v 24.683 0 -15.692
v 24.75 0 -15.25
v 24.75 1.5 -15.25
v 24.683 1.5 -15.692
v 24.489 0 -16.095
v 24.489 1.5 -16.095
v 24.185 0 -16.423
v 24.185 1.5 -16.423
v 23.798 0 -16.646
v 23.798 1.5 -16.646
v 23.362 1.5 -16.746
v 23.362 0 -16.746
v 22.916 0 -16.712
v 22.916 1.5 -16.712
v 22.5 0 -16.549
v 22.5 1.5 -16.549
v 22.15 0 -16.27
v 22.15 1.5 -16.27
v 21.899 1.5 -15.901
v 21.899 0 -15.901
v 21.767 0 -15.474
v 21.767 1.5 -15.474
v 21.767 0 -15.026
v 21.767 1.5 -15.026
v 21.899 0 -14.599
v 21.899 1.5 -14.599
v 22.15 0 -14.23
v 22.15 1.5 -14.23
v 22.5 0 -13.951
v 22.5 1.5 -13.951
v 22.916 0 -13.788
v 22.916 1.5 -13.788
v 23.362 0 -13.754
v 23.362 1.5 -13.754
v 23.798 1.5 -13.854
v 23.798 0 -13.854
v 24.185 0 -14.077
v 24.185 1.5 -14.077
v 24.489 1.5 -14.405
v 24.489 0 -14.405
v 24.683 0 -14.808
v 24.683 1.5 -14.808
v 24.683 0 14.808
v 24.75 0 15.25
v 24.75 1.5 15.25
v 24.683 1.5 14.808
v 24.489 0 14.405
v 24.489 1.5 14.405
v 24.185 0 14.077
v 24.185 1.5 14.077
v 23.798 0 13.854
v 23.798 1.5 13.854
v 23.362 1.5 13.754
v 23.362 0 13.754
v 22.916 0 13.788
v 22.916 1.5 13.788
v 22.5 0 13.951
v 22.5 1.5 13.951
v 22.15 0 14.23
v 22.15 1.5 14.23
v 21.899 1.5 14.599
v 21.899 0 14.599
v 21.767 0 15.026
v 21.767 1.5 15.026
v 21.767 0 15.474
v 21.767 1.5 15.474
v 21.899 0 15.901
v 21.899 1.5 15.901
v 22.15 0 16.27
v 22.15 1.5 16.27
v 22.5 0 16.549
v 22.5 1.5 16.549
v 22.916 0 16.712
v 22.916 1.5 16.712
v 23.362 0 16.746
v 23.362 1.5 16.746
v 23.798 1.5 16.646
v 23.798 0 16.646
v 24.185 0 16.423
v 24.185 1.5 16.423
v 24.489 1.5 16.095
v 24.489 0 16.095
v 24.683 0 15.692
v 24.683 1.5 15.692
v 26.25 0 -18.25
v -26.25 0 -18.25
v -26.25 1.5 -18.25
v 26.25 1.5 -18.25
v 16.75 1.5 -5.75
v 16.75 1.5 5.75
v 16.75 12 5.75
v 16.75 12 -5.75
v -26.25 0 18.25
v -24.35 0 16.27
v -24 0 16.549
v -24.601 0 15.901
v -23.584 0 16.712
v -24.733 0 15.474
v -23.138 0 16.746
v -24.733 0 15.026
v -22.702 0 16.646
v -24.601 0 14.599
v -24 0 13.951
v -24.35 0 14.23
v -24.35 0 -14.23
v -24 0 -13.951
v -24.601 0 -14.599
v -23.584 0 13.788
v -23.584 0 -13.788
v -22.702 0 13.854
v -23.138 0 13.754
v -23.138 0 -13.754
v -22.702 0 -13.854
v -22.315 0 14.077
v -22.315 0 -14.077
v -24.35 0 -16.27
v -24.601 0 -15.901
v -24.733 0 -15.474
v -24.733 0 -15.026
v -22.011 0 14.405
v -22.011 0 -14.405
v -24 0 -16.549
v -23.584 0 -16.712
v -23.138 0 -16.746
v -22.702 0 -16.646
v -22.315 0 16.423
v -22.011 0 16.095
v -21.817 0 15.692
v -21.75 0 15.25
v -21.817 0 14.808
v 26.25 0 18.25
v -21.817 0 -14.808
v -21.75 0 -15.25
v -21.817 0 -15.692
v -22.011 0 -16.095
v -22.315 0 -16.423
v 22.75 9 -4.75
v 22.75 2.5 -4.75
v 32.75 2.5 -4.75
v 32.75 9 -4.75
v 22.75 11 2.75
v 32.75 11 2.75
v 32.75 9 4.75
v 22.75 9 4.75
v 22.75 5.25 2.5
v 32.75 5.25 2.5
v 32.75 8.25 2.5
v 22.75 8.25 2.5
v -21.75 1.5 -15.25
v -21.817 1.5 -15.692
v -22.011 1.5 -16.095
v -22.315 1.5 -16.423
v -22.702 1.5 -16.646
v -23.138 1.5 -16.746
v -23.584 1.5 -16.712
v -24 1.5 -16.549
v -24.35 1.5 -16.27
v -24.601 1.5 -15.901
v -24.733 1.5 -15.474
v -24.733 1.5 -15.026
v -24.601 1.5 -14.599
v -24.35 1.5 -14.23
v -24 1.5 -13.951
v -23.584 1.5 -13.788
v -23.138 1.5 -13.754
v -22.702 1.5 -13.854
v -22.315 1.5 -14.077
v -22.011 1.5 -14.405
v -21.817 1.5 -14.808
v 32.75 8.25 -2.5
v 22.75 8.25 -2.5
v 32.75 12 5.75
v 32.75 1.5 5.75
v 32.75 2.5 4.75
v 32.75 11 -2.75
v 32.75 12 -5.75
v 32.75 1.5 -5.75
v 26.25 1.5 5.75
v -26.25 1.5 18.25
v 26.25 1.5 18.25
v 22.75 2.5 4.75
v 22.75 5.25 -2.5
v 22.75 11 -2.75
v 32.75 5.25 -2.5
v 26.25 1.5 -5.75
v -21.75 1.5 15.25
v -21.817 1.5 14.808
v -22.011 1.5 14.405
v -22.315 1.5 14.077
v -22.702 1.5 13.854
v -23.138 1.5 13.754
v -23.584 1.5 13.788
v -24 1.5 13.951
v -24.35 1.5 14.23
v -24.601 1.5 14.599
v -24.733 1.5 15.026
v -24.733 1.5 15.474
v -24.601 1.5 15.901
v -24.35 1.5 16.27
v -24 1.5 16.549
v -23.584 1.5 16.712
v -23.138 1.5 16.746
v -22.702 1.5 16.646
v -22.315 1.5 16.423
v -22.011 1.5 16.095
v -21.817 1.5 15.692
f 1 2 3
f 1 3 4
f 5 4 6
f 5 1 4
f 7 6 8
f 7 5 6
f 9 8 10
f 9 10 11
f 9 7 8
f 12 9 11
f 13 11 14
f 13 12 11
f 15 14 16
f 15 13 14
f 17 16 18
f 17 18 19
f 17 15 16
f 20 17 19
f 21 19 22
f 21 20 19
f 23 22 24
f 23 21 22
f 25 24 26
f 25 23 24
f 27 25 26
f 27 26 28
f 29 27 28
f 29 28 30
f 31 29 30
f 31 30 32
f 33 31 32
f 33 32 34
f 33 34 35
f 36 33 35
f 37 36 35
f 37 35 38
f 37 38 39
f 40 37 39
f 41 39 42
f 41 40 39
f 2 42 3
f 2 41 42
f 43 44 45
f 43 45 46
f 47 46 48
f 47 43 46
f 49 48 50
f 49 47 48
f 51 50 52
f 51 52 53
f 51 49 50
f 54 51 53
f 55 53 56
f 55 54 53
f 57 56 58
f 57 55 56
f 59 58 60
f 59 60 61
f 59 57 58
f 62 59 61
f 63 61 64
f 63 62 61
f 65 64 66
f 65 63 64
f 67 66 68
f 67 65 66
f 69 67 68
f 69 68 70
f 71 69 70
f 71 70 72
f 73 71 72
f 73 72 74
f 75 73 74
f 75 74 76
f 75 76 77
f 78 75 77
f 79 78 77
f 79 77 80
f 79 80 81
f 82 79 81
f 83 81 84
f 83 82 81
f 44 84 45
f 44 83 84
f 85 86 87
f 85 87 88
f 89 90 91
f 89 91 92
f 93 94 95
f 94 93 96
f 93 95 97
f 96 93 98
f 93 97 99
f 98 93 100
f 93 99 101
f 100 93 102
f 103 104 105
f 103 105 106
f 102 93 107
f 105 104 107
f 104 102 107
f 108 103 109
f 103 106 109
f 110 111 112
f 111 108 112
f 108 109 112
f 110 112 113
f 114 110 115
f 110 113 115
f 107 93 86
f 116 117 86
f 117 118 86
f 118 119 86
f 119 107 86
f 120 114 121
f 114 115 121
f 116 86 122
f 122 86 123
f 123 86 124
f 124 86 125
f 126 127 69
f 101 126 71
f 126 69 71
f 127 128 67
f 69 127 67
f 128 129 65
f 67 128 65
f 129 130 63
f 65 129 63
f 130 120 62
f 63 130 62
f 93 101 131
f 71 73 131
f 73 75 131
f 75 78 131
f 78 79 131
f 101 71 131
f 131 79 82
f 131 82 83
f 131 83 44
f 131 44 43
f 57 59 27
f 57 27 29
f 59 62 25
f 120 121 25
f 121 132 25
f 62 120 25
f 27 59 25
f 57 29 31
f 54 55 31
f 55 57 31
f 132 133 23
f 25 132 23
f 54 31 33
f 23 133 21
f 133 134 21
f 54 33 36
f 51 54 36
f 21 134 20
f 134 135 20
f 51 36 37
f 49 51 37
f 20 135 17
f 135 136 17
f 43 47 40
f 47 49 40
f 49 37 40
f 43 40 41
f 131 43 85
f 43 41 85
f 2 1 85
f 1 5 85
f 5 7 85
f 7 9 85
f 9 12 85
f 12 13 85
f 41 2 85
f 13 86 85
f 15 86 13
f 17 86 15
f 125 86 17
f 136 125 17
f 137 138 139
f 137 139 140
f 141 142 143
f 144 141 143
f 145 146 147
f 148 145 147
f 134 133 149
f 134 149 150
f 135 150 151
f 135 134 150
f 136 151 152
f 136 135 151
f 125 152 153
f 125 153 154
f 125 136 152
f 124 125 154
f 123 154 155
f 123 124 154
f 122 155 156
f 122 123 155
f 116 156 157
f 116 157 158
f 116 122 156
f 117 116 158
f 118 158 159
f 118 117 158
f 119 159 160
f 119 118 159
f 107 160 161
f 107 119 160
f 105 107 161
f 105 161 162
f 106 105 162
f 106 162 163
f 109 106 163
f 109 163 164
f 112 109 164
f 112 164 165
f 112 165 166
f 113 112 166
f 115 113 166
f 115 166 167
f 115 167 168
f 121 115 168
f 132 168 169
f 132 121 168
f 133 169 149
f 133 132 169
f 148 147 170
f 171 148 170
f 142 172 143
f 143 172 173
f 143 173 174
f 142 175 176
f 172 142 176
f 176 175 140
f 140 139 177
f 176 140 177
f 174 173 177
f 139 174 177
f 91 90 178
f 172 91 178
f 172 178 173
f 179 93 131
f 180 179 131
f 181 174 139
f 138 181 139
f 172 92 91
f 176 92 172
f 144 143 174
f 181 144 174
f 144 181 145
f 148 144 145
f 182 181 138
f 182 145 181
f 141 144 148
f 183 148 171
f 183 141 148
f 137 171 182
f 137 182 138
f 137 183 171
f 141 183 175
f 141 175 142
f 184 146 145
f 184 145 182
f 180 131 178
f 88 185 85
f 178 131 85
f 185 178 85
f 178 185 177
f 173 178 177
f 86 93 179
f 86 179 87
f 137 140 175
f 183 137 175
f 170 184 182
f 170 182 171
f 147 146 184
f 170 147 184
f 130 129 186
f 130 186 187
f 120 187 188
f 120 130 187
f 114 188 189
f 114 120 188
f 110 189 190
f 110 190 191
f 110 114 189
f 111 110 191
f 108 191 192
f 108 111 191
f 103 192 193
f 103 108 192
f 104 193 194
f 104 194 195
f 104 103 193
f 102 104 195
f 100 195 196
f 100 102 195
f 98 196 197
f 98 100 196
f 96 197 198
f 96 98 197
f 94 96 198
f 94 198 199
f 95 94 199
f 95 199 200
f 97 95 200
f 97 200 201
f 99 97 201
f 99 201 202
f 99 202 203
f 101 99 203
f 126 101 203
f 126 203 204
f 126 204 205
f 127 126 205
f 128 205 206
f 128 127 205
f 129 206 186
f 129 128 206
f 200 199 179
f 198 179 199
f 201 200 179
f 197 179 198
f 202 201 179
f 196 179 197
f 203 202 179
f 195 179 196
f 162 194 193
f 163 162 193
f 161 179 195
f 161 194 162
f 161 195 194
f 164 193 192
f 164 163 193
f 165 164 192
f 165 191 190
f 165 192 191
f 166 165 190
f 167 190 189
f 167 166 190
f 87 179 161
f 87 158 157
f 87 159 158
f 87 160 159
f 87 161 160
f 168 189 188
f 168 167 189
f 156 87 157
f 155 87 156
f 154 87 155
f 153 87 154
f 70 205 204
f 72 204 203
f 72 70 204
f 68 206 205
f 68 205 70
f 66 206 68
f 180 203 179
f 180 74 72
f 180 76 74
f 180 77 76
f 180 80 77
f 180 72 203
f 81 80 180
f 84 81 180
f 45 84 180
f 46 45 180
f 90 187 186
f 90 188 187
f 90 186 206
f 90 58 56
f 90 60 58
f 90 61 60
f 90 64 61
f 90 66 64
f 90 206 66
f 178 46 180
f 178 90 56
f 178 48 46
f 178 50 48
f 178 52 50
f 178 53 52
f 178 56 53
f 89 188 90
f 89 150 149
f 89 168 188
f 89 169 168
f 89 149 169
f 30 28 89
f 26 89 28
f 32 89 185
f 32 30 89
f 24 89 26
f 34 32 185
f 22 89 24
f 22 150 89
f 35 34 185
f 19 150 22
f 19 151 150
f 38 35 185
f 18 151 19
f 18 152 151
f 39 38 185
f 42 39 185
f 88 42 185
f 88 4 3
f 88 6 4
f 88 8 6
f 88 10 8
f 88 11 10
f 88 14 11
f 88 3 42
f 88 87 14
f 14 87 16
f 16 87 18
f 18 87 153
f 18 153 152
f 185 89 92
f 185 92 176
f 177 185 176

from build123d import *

# Parameters (mm, degrees)
SKETCH1_W           = 52.5
SKETCH1_H           = 36.5
SKETCH1_R           = 1.5
BOSS_EXTRUDE1_DEPTH = 1.5
SKETCH2_W           = 16
SKETCH2_H           = 11.5
BOSS_EXTRUDE2_DEPTH = 10.5
SKETCH7_W           = 5
SKETCH7_H           = 3
CUT_EXTRUDE1_DEPTH  = 10


with BuildPart() as part:
    # Sketch1 → Boss-Extrude1 (new body)
    with BuildSketch(Plane(origin=(0, 0, 0), x_dir=(1, 0, 0), z_dir=(0, 1, 0))):
        Rectangle(SKETCH1_W, SKETCH1_H)
        with Locations((-23.25, 15.25)):
            Circle(SKETCH1_R, mode=Mode.SUBTRACT)
        with Locations((23.25, 15.25)):
            Circle(SKETCH1_R, mode=Mode.SUBTRACT)
        with Locations((-23.25, -15.25)):
            Circle(SKETCH1_R, mode=Mode.SUBTRACT)
        with Locations((23.25, -15.25)):
            Circle(SKETCH1_R, mode=Mode.SUBTRACT)
    extrude(amount=BOSS_EXTRUDE1_DEPTH)

    # Sketch2 → Boss-Extrude2 (add)
    with BuildSketch(Plane(origin=(0, 1.5, 0), x_dir=(1, 0, 0), z_dir=(0, 1, 0))):
        with Locations((24.75, 0)):
            Rectangle(SKETCH2_W, SKETCH2_H)
    extrude(amount=BOSS_EXTRUDE2_DEPTH)

    # Sketch7 → Cut-Extrude1 (cut)
    with BuildSketch(Plane(origin=(32.75, 0, 0), x_dir=(0, 0, -1), z_dir=(1, 0, 0))):
        Polygon((-4.75, 2.5), (4.75, 2.5), (4.75, 9), (2.75, 11), (-2.75, 11), (-4.75, 9), align=None)
        with Locations((0, 6.75)):
            Rectangle(SKETCH7_W, SKETCH7_H, mode=Mode.SUBTRACT)
    extrude(amount=-CUT_EXTRUDE1_DEPTH, mode=Mode.SUBTRACT)


solid = part.part
